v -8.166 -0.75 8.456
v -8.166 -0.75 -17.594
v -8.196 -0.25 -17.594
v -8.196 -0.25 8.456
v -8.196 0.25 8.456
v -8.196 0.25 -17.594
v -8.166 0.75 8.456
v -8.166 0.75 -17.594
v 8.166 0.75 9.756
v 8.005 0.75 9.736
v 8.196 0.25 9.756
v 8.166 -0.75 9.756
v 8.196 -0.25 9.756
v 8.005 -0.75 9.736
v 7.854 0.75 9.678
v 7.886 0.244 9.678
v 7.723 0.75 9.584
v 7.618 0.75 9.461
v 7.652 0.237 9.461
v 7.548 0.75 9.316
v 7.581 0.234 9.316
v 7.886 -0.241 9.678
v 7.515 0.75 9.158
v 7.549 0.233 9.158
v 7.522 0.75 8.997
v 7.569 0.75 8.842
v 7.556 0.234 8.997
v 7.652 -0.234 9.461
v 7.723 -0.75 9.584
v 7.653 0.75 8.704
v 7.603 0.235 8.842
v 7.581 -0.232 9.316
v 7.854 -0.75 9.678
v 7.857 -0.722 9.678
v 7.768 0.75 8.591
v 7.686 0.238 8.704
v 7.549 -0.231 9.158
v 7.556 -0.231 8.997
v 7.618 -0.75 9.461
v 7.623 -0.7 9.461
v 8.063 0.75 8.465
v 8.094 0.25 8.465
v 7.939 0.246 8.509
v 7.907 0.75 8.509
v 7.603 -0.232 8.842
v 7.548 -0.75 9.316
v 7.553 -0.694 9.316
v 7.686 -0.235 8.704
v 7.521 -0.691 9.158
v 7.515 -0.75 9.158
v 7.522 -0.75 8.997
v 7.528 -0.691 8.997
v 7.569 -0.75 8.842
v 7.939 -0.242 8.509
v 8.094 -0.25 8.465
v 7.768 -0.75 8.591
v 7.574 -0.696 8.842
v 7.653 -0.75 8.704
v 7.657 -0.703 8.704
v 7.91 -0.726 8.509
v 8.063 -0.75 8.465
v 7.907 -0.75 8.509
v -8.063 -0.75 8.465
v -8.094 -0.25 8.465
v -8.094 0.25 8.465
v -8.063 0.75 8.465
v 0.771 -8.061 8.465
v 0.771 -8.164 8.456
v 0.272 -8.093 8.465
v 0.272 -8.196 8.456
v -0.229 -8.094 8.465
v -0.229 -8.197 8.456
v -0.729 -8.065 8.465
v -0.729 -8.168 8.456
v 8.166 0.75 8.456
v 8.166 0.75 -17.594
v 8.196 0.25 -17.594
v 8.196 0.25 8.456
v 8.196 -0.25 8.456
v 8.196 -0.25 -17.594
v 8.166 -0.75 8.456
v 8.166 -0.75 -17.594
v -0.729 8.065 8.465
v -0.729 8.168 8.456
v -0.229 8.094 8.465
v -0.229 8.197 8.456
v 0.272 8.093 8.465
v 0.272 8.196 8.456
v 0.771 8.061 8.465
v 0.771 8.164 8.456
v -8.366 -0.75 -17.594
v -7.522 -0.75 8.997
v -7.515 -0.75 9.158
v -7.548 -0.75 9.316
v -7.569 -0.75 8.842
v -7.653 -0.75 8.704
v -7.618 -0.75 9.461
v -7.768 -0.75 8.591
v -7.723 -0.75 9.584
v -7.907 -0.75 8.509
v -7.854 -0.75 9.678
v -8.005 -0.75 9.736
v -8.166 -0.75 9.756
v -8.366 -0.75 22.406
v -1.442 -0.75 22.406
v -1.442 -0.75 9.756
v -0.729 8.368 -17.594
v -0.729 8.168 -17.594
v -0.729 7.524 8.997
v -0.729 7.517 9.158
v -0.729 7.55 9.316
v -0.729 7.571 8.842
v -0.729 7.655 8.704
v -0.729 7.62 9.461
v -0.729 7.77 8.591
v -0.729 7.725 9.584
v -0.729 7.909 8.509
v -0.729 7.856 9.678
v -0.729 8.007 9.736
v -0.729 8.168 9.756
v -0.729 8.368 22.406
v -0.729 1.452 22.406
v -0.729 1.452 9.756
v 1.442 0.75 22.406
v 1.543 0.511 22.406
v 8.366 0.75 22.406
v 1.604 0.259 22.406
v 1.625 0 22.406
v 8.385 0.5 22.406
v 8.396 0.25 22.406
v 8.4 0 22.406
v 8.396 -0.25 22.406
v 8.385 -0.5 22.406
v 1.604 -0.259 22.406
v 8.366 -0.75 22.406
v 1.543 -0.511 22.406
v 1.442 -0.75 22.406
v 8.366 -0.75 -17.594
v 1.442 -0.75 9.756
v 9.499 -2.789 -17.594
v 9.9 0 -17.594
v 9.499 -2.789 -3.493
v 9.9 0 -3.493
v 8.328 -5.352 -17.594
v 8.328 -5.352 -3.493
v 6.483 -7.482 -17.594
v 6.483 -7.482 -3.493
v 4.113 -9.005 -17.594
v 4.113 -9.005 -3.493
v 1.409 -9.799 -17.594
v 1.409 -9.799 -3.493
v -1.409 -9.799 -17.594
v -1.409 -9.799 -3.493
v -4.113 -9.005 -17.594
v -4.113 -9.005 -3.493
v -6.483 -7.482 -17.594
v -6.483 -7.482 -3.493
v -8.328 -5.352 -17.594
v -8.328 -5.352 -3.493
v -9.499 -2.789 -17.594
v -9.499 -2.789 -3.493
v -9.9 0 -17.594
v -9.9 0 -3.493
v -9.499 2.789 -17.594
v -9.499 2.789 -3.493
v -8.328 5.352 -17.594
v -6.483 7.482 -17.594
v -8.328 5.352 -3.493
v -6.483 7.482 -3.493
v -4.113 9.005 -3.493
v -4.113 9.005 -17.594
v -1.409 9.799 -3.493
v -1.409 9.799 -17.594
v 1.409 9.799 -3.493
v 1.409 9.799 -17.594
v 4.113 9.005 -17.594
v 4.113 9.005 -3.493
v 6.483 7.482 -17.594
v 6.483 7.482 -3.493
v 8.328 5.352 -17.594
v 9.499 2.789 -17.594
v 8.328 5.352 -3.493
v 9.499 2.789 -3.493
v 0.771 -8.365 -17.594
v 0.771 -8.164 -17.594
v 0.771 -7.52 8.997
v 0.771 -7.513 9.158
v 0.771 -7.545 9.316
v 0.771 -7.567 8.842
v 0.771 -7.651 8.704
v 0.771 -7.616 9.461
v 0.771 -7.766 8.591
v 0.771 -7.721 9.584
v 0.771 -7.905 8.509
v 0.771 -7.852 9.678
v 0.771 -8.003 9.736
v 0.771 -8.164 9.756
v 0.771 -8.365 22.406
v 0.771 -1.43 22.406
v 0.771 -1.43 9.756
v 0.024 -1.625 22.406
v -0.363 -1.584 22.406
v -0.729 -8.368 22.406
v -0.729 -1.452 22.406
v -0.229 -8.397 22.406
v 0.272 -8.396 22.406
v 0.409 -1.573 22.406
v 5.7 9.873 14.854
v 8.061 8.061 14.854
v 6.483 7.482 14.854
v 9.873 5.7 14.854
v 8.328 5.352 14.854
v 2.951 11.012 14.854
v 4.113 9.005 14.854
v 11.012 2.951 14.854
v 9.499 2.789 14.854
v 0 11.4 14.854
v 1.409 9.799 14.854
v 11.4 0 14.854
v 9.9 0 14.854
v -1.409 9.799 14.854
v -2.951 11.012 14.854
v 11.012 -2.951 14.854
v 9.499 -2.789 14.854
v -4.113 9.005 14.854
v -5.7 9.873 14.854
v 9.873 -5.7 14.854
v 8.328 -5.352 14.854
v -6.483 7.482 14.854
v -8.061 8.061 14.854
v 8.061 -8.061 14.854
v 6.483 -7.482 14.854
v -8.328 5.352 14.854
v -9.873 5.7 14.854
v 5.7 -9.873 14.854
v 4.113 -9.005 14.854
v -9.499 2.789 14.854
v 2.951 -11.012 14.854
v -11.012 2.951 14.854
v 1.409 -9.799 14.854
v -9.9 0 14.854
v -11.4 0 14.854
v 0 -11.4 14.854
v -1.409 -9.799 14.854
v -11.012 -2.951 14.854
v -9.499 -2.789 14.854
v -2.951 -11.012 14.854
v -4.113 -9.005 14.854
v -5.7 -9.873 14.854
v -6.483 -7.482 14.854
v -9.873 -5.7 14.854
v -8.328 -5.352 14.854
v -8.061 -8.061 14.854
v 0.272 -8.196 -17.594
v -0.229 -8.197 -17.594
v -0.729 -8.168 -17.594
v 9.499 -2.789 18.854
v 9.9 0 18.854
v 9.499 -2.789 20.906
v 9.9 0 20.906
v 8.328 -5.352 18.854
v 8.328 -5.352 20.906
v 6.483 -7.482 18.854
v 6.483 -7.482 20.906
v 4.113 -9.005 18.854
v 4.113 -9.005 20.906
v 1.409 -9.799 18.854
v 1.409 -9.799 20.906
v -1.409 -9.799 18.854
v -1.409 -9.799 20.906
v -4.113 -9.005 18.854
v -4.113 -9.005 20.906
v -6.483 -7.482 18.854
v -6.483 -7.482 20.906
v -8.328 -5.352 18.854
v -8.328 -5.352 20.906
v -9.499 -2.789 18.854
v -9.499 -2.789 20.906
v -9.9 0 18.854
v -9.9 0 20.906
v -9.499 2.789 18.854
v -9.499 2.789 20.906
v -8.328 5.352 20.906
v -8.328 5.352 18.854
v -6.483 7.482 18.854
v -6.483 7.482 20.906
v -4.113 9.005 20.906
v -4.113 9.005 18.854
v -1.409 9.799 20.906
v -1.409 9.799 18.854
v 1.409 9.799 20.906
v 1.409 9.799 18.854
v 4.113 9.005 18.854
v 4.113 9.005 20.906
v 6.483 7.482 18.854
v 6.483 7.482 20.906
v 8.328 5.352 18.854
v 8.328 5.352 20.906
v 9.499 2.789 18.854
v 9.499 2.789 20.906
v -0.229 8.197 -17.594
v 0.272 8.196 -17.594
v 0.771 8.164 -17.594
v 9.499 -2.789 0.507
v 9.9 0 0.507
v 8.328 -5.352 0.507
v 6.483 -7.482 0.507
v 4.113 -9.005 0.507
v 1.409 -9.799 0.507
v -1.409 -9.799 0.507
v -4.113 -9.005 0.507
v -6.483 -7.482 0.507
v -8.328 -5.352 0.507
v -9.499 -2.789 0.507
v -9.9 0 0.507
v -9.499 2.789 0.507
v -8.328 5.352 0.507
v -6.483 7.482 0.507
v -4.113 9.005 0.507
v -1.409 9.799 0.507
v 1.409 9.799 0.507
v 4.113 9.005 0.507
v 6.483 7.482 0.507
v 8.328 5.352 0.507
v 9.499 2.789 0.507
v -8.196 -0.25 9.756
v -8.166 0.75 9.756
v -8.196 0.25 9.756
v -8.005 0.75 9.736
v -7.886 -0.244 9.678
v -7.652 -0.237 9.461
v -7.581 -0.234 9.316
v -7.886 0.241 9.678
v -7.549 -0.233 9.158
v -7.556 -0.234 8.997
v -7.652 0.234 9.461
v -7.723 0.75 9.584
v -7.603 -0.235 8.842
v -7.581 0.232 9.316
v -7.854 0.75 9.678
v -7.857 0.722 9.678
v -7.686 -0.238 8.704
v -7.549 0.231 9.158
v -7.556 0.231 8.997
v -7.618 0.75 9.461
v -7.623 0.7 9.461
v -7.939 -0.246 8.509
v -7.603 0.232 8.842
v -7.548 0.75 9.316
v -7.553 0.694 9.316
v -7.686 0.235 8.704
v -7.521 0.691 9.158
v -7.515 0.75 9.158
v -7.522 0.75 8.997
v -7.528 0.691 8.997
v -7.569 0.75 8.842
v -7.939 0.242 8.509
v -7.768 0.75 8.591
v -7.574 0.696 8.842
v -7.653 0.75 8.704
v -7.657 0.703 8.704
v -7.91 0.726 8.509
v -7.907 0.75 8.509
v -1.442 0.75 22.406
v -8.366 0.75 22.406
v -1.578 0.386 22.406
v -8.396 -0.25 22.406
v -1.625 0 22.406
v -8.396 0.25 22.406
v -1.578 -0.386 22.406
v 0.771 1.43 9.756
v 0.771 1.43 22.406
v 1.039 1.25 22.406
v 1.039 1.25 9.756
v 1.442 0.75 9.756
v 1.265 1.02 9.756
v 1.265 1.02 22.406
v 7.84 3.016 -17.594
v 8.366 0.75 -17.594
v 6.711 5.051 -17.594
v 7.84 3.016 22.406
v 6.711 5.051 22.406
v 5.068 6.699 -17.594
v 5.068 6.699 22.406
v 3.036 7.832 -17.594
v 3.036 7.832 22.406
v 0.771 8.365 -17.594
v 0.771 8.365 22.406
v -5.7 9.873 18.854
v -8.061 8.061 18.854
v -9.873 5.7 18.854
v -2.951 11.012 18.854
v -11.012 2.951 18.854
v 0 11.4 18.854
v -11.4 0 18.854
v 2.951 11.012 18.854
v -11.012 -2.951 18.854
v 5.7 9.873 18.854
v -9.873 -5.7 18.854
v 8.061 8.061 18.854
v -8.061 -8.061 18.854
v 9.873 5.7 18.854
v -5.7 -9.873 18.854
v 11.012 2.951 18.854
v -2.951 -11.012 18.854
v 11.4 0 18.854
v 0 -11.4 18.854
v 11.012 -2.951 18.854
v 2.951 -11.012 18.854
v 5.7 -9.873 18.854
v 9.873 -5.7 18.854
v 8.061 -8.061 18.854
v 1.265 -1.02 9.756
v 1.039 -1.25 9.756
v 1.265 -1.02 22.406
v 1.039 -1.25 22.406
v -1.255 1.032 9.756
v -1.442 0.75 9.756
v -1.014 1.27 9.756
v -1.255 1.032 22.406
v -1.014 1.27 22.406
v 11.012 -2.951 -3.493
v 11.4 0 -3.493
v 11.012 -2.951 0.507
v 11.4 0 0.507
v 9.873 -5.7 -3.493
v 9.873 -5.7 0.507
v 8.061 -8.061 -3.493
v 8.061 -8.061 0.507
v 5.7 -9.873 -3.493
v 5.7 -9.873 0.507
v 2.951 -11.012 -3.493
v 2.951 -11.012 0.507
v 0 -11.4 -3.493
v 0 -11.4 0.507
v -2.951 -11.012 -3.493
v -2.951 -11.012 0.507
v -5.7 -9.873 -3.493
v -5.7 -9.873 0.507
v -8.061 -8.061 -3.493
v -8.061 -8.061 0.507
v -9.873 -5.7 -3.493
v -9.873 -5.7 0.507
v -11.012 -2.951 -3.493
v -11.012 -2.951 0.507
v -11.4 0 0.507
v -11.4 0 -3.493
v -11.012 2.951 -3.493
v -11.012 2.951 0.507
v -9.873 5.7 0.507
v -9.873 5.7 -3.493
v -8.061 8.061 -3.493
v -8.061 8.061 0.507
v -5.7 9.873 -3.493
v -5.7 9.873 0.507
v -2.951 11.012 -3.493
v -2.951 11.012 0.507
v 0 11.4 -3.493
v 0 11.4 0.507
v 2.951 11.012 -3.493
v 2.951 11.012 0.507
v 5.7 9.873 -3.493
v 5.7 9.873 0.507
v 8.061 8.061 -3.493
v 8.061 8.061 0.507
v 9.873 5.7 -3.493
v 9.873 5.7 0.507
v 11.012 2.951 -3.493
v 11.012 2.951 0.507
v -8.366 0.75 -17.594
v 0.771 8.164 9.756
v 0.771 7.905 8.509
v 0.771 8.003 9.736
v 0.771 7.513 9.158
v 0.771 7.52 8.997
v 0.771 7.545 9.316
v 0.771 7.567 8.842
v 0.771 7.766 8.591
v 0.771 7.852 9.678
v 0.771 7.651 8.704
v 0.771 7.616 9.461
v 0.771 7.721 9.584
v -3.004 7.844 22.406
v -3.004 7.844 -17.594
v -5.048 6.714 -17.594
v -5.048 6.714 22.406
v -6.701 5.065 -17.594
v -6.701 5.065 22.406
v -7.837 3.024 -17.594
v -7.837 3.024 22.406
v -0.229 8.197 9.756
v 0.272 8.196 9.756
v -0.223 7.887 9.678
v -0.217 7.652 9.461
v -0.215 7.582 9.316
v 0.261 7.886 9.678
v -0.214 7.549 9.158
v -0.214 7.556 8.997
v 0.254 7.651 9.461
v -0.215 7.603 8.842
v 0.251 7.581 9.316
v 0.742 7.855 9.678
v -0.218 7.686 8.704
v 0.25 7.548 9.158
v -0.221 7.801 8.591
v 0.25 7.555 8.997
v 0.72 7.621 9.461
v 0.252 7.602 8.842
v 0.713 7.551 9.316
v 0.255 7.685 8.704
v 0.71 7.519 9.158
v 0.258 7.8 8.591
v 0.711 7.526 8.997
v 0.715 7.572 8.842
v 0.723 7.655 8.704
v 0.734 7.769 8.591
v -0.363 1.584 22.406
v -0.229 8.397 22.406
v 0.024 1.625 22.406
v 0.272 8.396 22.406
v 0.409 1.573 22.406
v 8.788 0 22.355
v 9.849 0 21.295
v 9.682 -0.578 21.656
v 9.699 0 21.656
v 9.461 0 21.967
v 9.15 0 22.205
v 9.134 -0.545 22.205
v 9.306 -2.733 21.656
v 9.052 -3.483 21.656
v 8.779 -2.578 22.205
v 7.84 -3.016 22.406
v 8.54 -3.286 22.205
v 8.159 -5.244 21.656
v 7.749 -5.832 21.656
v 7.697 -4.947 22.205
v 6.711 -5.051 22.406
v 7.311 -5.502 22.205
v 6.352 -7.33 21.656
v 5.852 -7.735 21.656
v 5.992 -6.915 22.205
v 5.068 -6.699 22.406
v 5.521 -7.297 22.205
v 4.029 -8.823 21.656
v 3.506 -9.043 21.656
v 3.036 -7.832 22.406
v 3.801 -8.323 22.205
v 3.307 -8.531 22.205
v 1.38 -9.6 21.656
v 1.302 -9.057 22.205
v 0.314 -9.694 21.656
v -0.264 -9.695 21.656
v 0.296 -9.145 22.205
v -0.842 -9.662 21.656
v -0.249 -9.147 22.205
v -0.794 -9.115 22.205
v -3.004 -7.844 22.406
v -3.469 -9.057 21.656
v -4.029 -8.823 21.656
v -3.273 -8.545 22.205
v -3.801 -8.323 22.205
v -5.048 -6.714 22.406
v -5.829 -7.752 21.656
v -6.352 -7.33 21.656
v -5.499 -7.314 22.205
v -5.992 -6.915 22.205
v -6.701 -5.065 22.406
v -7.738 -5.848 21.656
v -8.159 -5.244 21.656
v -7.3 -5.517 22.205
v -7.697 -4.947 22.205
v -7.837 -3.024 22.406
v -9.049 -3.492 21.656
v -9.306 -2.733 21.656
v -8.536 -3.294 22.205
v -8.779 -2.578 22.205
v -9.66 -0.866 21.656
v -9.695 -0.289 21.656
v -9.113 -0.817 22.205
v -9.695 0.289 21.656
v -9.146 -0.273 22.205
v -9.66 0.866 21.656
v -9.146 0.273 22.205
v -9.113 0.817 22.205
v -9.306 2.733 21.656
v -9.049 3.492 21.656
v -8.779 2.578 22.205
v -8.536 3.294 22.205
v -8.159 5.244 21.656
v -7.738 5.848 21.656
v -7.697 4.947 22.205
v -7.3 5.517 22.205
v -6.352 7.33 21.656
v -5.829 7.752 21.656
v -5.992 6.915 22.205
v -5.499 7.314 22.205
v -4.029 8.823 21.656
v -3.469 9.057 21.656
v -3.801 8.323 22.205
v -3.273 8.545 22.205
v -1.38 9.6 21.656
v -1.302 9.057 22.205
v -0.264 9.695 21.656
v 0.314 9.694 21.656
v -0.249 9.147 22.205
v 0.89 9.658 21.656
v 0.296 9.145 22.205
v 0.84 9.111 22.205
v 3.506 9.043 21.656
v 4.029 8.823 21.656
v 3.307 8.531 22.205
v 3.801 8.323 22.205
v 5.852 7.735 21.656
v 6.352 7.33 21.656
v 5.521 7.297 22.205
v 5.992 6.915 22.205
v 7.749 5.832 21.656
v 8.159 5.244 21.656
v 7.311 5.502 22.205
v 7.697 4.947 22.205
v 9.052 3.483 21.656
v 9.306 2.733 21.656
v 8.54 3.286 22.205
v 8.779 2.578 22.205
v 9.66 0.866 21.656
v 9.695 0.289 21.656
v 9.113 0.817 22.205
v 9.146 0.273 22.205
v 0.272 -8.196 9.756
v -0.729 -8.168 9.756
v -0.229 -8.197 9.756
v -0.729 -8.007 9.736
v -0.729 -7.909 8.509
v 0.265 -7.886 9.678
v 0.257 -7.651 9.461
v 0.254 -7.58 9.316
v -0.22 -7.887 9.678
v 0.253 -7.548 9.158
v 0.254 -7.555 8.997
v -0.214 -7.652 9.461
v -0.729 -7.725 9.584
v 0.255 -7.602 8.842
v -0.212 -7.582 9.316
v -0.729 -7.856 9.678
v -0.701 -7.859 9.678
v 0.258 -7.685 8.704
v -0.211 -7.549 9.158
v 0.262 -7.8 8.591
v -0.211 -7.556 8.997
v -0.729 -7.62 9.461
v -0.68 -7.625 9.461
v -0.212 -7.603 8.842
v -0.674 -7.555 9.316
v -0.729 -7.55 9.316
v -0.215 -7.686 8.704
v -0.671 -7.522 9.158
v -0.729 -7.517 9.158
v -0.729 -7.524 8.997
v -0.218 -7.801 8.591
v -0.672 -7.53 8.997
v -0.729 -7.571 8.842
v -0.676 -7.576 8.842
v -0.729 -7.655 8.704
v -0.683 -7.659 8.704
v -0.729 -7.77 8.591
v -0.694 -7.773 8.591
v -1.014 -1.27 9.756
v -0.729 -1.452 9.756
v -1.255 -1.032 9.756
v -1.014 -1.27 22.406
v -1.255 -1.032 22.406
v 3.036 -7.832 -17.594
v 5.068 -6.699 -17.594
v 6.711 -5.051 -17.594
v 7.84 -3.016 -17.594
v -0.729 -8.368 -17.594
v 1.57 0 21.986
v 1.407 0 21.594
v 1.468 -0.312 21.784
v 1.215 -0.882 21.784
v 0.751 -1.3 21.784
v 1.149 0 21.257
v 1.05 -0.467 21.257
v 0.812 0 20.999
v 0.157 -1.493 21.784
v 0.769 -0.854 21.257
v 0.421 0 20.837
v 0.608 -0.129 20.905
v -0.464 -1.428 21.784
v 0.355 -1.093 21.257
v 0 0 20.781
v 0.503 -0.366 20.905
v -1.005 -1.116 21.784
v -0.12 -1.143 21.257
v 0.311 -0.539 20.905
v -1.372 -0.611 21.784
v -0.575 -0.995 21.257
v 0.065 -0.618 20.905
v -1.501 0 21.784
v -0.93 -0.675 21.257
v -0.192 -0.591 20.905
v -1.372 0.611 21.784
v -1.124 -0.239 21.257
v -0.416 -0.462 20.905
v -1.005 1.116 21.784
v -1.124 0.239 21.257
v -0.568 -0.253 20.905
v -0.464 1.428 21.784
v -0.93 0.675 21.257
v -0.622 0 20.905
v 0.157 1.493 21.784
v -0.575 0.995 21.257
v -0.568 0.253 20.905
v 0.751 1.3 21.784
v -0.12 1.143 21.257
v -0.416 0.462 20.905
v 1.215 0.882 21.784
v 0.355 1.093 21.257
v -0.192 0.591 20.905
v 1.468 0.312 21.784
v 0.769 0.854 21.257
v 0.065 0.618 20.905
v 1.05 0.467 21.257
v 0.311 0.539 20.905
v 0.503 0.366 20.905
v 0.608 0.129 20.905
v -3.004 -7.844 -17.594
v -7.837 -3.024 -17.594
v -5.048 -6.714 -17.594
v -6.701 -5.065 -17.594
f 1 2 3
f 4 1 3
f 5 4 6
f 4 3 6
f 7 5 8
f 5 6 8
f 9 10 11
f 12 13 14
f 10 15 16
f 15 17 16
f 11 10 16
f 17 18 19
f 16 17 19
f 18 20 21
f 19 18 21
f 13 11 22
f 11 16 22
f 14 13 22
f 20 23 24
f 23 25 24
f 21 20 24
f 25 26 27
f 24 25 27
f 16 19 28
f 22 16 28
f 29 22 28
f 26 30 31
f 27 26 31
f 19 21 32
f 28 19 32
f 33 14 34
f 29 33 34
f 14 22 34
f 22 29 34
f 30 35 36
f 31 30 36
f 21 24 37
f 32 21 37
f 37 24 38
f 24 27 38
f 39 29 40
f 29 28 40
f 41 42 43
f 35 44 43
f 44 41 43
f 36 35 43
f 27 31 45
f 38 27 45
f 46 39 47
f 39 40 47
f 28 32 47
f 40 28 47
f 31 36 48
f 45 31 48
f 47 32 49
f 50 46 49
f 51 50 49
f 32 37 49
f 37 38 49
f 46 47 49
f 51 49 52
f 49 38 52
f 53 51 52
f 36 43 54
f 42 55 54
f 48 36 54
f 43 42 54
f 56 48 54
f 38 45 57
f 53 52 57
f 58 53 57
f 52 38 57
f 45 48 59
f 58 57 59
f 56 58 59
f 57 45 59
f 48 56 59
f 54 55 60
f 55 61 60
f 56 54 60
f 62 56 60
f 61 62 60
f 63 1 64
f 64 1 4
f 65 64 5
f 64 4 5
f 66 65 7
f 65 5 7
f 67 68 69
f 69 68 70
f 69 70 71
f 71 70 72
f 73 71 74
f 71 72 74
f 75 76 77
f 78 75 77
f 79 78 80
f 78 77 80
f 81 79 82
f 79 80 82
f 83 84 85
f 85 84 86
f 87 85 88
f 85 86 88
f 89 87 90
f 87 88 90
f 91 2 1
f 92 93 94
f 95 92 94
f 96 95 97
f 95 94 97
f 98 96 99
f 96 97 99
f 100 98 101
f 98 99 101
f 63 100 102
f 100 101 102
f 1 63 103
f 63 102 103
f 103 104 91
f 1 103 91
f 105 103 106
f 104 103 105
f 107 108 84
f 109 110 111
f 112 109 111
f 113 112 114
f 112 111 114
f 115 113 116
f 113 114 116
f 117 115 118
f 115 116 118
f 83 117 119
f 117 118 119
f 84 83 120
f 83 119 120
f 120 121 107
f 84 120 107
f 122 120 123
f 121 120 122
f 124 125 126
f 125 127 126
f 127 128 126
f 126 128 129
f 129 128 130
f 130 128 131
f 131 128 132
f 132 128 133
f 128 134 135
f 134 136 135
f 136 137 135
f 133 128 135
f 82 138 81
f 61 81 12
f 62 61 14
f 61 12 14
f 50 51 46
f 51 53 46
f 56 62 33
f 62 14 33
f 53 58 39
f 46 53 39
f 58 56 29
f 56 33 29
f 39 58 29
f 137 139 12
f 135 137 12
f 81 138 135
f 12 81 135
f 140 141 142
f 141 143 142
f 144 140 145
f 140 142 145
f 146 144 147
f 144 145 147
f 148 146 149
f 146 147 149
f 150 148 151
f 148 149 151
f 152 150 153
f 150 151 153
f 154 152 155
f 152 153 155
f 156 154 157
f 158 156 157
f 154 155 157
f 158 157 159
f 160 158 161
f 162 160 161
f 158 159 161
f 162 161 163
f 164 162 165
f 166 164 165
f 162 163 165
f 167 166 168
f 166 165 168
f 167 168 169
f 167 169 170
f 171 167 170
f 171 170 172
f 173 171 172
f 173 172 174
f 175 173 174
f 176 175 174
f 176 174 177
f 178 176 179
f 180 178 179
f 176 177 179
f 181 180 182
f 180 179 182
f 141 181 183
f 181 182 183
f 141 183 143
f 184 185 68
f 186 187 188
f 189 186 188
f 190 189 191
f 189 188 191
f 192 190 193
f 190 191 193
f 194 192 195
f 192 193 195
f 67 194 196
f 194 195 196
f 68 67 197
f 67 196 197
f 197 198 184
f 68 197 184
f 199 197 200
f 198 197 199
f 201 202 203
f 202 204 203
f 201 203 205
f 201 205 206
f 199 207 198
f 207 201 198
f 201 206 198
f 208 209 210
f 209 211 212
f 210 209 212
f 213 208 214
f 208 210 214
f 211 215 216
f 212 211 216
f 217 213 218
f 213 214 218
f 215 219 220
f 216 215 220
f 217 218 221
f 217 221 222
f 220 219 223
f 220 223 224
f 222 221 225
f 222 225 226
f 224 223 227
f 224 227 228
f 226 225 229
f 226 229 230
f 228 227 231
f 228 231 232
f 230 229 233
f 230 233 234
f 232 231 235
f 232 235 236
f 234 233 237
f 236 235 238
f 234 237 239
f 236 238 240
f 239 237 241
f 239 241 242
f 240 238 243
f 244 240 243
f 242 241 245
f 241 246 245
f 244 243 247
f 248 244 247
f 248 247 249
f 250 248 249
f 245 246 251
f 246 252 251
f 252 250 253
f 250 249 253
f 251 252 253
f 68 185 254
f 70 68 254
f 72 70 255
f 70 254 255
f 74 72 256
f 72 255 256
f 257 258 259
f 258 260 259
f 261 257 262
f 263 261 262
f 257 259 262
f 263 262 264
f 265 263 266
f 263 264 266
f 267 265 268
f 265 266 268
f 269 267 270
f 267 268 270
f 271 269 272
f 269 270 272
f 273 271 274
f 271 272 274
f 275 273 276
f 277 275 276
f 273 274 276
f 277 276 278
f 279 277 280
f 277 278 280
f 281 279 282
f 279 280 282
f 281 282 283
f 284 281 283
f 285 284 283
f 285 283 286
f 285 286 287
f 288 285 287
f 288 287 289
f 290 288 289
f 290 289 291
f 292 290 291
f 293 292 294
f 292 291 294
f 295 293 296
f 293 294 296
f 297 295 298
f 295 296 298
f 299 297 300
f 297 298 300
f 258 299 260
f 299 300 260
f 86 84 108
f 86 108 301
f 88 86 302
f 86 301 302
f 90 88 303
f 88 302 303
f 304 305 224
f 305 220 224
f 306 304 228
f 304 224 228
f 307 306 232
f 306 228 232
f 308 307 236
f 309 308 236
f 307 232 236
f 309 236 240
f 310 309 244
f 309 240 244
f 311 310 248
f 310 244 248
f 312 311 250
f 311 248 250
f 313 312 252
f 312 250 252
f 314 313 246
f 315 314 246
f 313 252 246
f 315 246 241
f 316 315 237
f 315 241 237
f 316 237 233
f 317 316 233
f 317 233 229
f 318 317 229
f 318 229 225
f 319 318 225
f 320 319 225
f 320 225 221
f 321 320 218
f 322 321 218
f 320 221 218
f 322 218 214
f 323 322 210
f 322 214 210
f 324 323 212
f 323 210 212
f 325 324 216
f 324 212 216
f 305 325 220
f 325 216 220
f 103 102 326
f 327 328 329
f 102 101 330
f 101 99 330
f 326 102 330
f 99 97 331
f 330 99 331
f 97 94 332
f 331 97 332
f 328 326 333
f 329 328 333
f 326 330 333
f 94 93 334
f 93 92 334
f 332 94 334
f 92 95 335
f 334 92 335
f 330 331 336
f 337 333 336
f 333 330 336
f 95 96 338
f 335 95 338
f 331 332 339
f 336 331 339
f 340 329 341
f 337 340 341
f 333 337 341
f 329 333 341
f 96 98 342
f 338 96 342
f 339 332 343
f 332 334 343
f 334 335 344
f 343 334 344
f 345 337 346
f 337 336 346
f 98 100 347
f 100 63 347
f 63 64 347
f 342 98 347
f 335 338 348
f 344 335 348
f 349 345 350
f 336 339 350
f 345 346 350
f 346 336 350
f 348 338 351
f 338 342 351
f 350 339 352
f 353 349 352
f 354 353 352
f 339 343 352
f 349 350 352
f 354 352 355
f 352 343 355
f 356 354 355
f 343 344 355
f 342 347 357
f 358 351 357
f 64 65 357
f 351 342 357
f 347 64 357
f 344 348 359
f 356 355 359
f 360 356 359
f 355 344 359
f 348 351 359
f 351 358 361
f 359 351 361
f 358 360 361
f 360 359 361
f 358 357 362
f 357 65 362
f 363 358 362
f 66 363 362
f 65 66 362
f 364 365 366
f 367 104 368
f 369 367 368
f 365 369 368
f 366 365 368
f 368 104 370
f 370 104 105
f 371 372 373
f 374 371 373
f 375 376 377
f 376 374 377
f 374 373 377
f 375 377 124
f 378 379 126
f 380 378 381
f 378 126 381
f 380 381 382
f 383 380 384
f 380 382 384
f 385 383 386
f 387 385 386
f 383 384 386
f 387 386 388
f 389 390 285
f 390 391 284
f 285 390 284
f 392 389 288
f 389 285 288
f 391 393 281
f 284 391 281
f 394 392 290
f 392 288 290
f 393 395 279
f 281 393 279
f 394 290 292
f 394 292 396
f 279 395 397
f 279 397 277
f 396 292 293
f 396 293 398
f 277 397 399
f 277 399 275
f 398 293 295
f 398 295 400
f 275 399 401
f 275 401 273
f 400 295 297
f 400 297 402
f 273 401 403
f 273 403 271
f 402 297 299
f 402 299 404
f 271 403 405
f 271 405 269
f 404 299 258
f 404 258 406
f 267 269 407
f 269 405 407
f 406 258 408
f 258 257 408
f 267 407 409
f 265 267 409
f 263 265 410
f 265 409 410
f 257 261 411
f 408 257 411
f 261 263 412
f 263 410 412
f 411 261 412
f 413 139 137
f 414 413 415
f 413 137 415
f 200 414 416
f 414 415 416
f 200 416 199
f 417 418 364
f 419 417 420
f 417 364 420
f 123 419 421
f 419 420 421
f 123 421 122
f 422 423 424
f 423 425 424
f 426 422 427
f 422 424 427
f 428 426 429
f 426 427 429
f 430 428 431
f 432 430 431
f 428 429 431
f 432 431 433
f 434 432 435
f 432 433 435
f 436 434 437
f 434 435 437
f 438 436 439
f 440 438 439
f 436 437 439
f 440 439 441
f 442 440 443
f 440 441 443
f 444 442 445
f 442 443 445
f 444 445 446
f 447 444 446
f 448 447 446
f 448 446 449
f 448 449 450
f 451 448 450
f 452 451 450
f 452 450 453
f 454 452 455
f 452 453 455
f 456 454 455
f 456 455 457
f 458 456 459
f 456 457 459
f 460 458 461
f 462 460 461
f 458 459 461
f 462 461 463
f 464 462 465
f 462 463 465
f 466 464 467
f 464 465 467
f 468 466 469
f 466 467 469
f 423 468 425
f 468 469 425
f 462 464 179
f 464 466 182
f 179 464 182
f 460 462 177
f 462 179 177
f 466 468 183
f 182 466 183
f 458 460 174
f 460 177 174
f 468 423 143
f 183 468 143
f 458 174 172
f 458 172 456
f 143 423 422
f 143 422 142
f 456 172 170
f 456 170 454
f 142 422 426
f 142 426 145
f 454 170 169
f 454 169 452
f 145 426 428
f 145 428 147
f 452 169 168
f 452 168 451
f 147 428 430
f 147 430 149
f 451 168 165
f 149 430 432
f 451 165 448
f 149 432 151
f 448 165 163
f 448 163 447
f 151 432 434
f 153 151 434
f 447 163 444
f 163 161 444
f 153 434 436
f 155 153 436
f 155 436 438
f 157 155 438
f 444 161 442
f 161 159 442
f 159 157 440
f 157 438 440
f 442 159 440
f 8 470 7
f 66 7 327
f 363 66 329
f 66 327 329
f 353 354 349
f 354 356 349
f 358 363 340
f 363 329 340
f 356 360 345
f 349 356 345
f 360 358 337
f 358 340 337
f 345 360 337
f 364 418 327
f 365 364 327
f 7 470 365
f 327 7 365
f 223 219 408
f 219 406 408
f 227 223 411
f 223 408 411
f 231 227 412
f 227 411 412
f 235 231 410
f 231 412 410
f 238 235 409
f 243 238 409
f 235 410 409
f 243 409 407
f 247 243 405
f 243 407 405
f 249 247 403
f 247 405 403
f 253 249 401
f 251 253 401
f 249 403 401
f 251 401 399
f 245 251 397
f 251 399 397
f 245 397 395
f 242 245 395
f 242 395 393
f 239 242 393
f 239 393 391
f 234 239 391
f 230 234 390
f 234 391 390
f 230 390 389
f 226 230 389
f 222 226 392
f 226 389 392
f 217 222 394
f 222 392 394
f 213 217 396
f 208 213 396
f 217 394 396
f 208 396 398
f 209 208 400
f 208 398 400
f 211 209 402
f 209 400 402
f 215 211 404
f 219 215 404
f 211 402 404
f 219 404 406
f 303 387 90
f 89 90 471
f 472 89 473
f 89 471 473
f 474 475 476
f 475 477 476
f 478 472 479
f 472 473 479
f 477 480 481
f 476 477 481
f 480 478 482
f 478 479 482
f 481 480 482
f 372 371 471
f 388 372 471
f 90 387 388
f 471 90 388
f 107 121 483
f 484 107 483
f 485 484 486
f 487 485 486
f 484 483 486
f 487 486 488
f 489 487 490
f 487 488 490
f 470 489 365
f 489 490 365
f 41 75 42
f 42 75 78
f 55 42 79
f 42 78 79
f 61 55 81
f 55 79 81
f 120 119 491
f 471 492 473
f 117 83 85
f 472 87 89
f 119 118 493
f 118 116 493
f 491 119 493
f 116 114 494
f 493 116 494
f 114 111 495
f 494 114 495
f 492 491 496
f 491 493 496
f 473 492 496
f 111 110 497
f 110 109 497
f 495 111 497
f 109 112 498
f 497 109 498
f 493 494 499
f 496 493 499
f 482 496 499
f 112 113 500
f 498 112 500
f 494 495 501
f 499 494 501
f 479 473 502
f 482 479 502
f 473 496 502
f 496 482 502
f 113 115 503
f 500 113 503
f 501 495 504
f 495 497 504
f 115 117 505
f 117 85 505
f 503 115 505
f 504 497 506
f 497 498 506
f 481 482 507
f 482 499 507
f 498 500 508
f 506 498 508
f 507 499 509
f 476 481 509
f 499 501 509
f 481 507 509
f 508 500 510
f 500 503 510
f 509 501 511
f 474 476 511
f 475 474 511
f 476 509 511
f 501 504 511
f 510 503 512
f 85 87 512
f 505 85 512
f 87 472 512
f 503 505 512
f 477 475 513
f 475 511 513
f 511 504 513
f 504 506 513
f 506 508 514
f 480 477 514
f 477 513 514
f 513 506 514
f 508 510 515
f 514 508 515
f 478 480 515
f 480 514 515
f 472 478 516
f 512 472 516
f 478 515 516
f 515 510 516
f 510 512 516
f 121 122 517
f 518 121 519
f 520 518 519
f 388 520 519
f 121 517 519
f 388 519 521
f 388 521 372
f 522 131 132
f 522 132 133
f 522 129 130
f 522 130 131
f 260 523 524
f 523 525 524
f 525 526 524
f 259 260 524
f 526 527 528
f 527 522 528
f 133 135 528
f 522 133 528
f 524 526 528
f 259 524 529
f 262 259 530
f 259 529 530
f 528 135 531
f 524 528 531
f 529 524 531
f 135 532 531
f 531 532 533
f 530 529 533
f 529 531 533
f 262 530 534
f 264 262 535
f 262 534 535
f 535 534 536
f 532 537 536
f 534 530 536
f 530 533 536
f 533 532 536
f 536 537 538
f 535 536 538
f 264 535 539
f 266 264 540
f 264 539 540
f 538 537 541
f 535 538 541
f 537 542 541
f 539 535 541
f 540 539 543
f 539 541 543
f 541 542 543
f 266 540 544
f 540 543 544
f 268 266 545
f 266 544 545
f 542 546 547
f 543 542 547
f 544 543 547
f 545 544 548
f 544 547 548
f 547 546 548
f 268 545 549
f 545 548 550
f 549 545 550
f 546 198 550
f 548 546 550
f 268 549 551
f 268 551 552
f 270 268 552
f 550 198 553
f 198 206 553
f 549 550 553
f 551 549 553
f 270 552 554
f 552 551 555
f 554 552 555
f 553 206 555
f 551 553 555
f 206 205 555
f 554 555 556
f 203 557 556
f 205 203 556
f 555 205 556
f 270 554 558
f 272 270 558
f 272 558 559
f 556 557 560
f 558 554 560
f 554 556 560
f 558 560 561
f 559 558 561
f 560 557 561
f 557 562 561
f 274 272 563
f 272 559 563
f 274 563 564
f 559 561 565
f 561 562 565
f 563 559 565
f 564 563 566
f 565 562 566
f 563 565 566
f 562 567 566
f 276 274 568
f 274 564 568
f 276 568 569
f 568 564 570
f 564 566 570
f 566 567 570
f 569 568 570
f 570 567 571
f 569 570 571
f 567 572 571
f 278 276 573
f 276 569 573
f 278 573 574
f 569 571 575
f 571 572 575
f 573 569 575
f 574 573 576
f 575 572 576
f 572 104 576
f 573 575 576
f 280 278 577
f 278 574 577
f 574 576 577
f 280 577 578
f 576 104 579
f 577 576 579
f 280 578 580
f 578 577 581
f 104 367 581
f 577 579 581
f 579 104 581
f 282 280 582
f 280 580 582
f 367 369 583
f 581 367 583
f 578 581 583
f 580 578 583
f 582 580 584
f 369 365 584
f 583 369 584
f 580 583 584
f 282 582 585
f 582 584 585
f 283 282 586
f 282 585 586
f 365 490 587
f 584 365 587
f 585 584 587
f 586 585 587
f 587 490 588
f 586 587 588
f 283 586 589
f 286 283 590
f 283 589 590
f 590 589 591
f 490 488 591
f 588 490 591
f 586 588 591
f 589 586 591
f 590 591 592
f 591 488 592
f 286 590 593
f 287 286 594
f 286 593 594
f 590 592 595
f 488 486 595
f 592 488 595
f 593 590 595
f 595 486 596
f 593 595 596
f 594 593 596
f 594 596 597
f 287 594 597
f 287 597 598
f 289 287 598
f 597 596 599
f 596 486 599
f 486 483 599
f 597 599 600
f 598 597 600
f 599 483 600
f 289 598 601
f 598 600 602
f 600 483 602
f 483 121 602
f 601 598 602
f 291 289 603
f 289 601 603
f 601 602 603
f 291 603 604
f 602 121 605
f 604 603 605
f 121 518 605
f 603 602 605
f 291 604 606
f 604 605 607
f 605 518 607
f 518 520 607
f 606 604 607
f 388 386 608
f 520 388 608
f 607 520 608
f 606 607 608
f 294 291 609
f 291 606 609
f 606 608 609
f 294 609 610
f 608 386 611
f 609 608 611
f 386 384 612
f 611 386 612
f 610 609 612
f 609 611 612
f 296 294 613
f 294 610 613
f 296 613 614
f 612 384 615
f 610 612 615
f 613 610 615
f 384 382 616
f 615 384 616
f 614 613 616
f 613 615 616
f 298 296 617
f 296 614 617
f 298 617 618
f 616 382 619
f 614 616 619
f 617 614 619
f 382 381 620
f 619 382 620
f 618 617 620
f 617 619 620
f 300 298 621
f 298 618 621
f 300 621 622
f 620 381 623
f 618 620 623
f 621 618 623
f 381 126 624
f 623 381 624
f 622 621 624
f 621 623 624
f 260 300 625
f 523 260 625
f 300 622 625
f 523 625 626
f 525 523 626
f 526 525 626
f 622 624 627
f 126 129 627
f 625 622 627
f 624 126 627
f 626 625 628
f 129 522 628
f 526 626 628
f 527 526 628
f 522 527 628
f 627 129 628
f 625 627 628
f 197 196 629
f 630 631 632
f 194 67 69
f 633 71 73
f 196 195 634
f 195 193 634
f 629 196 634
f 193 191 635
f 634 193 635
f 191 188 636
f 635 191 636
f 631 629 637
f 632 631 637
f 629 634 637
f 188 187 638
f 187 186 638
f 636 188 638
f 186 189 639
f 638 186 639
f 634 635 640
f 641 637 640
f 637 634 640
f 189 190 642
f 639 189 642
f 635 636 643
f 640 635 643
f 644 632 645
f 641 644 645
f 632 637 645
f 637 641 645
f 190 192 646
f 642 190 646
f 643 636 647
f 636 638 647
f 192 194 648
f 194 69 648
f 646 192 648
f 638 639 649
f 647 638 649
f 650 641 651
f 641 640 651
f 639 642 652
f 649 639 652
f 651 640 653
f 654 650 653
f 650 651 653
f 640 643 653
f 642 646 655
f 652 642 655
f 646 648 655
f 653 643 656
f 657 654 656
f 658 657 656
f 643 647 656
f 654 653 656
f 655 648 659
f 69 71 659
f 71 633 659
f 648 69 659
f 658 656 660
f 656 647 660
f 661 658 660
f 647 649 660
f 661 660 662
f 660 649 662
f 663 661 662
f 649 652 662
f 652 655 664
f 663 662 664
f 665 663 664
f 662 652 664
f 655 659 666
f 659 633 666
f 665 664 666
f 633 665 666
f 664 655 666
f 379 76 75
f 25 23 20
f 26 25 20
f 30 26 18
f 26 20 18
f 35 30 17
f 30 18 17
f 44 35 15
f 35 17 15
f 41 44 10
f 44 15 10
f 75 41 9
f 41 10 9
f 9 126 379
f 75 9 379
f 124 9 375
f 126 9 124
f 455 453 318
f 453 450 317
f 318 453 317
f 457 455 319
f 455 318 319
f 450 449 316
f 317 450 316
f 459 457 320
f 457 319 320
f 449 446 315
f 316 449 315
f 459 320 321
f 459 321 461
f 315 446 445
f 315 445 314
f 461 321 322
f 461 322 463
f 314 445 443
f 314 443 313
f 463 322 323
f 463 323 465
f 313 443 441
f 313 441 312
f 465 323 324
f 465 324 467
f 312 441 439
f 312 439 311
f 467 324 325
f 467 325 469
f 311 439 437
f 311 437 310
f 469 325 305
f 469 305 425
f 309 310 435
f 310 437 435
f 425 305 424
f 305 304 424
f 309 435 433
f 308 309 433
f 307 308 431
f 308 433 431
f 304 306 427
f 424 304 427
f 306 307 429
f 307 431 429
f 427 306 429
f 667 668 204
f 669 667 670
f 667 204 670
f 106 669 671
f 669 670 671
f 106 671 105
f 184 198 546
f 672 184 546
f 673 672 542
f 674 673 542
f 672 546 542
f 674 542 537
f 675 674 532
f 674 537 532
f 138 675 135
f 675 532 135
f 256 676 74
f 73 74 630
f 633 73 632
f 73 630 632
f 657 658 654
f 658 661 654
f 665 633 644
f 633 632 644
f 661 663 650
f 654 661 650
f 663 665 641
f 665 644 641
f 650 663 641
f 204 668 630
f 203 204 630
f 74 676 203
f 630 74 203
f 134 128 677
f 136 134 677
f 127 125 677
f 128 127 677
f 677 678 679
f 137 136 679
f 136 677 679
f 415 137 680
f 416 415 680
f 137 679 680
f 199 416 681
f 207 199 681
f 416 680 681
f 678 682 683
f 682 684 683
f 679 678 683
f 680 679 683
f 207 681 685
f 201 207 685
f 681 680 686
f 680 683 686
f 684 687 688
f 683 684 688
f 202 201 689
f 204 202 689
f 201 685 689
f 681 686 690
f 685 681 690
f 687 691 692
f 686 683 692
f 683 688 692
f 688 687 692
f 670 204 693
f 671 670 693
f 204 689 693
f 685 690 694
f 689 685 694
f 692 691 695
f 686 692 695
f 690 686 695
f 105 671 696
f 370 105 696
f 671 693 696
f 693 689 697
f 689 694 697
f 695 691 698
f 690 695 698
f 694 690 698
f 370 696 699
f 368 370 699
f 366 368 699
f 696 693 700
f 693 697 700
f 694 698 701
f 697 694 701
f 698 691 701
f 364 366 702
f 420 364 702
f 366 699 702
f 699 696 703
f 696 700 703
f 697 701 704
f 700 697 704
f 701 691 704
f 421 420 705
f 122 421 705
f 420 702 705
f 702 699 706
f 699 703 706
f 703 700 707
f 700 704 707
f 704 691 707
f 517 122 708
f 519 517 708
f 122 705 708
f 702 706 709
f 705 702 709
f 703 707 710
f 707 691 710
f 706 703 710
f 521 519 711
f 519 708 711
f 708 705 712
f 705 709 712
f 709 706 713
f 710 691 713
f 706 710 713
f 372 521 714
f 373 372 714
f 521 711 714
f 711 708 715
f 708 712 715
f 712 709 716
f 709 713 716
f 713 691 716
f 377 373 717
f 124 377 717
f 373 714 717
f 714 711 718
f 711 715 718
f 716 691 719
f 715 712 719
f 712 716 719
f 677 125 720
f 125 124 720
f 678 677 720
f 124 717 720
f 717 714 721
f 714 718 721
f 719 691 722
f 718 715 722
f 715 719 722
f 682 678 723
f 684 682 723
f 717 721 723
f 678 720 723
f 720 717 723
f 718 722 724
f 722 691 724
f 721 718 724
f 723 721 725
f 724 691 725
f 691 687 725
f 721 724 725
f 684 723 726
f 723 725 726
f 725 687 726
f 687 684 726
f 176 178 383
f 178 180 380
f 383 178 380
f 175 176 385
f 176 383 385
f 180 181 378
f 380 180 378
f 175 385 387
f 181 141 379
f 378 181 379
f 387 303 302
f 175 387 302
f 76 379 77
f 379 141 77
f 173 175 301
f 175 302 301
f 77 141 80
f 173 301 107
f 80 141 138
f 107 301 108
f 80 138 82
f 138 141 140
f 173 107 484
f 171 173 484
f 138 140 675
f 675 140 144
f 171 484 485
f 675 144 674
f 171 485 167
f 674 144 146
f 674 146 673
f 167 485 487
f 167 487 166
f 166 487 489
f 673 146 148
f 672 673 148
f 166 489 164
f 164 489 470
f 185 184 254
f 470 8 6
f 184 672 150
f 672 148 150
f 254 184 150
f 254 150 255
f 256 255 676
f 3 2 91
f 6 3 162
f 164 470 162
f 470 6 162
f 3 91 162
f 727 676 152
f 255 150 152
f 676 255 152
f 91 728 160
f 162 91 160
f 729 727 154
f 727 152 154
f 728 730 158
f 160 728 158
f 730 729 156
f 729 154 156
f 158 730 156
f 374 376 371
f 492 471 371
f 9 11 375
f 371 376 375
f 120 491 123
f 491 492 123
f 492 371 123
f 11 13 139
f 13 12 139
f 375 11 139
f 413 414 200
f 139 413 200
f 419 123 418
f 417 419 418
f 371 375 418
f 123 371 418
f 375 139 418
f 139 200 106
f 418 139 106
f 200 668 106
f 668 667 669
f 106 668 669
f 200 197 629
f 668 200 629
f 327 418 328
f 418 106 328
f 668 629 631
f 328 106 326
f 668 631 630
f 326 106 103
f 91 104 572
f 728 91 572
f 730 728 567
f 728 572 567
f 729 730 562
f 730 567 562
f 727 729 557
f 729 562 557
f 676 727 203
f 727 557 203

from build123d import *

# Parameters (mm, degrees)
F0_W     = 8.2
F0_H     = 10.1501198854
F3_DEPTH = 40.001


with BuildPart() as f1:
    # F0 (on Front) → F1 (revolve)
    with BuildSketch(Plane.XZ):
        with BuildLine():
            Line((0, 20.7812930996), (0, 19.9062930996))
            Line((0, 19.9062930996), (8.2, 19.9062930996))
            Line((8.2, 19.9062930996), (8.2, 9.7561732142))
            ThreePointArc((8.2, 9.7561732142), (7.5521513161, 9.157637487), (8.0976322153, 8.4645260079))
            ThreePointArc((8.0976322153, 8.4645260079), (8.1486556126, 8.4584444157), (8.2, 8.456412985))
            Line((8.2, 8.456412985), (8.2, 8.4481973997))
            Line((8.2, 8.4481973997), (8.2, -17.5937069004))
            Line((8.2, -17.5937069004), (9.9, -17.5937069004))
            Line((9.9, -17.5937069004), (9.9, -3.4926675876))
            Line((9.9, -3.4926675876), (11.4, -3.4926675876))
            Line((11.4, -3.4926675876), (11.4, 0.5073324124))
            Line((11.4, 0.5073324124), (9.9, 0.5073324124))
            Line((9.9, 0.5073324124), (9.9, 14.8537900239))
            Line((9.9, 14.8537900239), (11.4, 14.8537900239))
            Line((11.4, 14.8537900239), (11.4, 18.8537900239))
            Line((11.4, 18.8537900239), (9.9, 18.8537900239))
            Line((9.9, 18.8537900239), (9.9, 20.9062930996))
            ThreePointArc((9.9, 20.9062930996), (9.4606601718, 21.9669532714), (8.4, 22.4062930996))
            Line((8.4, 22.4062930996), (1.625, 22.4062930996))
            ThreePointArc((1.625, 22.4062930996), (1.1490485194, 21.2572445802), (0, 20.7812930996))
        make_face()
        with Locations((4.1, 14.8312331569)):
            Rectangle(F0_W, F0_H)
    revolve(axis=Axis((0, 0, 1.5937930996), (0, 0, -1)))

    # F2 (on face) → F3 (cut, through all)
    with BuildSketch(Plane.XY.offset(22.4062930996)):
        with BuildLine():
            Line((-0.7288242211, 1.4523912196), (-0.7288242211, 8.368322129))
            ThreePointArc((-0.7288242211, 8.368322129), (-5.9321762632, 5.9472081503), (-8.3664508604, 0.75))
            Line((-8.3664508604, 0.75), (-1.4415703243, 0.75))
            ThreePointArc((-1.4415703243, 0.75), (-1.1406101337, 1.1574253855), (-0.7288242211, 1.4523912196))
        make_face()
        with BuildLine():
            Line((-1.4415703243, -0.75), (-8.3664508604, -0.75))
            ThreePointArc((-8.3664508604, -0.75), (-5.9321762632, -5.9472081503), (-0.7288242211, -8.368322129))
            Line((-0.7288242211, -8.368322129), (-0.7288242211, -1.4523912196))
            ThreePointArc((-0.7288242211, -1.4523912196), (-1.1406101337, -1.1574253855), (-1.4415703243, -0.75))
        make_face()
        with BuildLine():
            ThreePointArc((0.7711757789, -8.3645255644), (5.9472098536, -5.9321745555), (8.3664508604, -0.75))
            Line((8.3664508604, -0.75), (1.4415703243, -0.75))
            ThreePointArc((1.4415703243, -0.75), (1.1574894223, -1.1405451492), (0.7711757789, -1.4303541233))
            Line((0.7711757789, -1.4303541233), (0.7711757789, -8.3645255644))
        make_face()
        with BuildLine():
            ThreePointArc((8.3664508604, 0.75), (5.9472098536, 5.9321745555), (0.7711757789, 8.3645255644))
            Line((0.7711757789, 8.3645255644), (0.7711757789, 1.4303541233))
            ThreePointArc((0.7711757789, 1.4303541233), (1.1574894223, 1.1405451492), (1.4415703243, 0.75))
            Line((1.4415703243, 0.75), (8.3664508604, 0.75))
        make_face()
    extrude(amount=-F3_DEPTH, mode=Mode.SUBTRACT)


solid = f1.part
